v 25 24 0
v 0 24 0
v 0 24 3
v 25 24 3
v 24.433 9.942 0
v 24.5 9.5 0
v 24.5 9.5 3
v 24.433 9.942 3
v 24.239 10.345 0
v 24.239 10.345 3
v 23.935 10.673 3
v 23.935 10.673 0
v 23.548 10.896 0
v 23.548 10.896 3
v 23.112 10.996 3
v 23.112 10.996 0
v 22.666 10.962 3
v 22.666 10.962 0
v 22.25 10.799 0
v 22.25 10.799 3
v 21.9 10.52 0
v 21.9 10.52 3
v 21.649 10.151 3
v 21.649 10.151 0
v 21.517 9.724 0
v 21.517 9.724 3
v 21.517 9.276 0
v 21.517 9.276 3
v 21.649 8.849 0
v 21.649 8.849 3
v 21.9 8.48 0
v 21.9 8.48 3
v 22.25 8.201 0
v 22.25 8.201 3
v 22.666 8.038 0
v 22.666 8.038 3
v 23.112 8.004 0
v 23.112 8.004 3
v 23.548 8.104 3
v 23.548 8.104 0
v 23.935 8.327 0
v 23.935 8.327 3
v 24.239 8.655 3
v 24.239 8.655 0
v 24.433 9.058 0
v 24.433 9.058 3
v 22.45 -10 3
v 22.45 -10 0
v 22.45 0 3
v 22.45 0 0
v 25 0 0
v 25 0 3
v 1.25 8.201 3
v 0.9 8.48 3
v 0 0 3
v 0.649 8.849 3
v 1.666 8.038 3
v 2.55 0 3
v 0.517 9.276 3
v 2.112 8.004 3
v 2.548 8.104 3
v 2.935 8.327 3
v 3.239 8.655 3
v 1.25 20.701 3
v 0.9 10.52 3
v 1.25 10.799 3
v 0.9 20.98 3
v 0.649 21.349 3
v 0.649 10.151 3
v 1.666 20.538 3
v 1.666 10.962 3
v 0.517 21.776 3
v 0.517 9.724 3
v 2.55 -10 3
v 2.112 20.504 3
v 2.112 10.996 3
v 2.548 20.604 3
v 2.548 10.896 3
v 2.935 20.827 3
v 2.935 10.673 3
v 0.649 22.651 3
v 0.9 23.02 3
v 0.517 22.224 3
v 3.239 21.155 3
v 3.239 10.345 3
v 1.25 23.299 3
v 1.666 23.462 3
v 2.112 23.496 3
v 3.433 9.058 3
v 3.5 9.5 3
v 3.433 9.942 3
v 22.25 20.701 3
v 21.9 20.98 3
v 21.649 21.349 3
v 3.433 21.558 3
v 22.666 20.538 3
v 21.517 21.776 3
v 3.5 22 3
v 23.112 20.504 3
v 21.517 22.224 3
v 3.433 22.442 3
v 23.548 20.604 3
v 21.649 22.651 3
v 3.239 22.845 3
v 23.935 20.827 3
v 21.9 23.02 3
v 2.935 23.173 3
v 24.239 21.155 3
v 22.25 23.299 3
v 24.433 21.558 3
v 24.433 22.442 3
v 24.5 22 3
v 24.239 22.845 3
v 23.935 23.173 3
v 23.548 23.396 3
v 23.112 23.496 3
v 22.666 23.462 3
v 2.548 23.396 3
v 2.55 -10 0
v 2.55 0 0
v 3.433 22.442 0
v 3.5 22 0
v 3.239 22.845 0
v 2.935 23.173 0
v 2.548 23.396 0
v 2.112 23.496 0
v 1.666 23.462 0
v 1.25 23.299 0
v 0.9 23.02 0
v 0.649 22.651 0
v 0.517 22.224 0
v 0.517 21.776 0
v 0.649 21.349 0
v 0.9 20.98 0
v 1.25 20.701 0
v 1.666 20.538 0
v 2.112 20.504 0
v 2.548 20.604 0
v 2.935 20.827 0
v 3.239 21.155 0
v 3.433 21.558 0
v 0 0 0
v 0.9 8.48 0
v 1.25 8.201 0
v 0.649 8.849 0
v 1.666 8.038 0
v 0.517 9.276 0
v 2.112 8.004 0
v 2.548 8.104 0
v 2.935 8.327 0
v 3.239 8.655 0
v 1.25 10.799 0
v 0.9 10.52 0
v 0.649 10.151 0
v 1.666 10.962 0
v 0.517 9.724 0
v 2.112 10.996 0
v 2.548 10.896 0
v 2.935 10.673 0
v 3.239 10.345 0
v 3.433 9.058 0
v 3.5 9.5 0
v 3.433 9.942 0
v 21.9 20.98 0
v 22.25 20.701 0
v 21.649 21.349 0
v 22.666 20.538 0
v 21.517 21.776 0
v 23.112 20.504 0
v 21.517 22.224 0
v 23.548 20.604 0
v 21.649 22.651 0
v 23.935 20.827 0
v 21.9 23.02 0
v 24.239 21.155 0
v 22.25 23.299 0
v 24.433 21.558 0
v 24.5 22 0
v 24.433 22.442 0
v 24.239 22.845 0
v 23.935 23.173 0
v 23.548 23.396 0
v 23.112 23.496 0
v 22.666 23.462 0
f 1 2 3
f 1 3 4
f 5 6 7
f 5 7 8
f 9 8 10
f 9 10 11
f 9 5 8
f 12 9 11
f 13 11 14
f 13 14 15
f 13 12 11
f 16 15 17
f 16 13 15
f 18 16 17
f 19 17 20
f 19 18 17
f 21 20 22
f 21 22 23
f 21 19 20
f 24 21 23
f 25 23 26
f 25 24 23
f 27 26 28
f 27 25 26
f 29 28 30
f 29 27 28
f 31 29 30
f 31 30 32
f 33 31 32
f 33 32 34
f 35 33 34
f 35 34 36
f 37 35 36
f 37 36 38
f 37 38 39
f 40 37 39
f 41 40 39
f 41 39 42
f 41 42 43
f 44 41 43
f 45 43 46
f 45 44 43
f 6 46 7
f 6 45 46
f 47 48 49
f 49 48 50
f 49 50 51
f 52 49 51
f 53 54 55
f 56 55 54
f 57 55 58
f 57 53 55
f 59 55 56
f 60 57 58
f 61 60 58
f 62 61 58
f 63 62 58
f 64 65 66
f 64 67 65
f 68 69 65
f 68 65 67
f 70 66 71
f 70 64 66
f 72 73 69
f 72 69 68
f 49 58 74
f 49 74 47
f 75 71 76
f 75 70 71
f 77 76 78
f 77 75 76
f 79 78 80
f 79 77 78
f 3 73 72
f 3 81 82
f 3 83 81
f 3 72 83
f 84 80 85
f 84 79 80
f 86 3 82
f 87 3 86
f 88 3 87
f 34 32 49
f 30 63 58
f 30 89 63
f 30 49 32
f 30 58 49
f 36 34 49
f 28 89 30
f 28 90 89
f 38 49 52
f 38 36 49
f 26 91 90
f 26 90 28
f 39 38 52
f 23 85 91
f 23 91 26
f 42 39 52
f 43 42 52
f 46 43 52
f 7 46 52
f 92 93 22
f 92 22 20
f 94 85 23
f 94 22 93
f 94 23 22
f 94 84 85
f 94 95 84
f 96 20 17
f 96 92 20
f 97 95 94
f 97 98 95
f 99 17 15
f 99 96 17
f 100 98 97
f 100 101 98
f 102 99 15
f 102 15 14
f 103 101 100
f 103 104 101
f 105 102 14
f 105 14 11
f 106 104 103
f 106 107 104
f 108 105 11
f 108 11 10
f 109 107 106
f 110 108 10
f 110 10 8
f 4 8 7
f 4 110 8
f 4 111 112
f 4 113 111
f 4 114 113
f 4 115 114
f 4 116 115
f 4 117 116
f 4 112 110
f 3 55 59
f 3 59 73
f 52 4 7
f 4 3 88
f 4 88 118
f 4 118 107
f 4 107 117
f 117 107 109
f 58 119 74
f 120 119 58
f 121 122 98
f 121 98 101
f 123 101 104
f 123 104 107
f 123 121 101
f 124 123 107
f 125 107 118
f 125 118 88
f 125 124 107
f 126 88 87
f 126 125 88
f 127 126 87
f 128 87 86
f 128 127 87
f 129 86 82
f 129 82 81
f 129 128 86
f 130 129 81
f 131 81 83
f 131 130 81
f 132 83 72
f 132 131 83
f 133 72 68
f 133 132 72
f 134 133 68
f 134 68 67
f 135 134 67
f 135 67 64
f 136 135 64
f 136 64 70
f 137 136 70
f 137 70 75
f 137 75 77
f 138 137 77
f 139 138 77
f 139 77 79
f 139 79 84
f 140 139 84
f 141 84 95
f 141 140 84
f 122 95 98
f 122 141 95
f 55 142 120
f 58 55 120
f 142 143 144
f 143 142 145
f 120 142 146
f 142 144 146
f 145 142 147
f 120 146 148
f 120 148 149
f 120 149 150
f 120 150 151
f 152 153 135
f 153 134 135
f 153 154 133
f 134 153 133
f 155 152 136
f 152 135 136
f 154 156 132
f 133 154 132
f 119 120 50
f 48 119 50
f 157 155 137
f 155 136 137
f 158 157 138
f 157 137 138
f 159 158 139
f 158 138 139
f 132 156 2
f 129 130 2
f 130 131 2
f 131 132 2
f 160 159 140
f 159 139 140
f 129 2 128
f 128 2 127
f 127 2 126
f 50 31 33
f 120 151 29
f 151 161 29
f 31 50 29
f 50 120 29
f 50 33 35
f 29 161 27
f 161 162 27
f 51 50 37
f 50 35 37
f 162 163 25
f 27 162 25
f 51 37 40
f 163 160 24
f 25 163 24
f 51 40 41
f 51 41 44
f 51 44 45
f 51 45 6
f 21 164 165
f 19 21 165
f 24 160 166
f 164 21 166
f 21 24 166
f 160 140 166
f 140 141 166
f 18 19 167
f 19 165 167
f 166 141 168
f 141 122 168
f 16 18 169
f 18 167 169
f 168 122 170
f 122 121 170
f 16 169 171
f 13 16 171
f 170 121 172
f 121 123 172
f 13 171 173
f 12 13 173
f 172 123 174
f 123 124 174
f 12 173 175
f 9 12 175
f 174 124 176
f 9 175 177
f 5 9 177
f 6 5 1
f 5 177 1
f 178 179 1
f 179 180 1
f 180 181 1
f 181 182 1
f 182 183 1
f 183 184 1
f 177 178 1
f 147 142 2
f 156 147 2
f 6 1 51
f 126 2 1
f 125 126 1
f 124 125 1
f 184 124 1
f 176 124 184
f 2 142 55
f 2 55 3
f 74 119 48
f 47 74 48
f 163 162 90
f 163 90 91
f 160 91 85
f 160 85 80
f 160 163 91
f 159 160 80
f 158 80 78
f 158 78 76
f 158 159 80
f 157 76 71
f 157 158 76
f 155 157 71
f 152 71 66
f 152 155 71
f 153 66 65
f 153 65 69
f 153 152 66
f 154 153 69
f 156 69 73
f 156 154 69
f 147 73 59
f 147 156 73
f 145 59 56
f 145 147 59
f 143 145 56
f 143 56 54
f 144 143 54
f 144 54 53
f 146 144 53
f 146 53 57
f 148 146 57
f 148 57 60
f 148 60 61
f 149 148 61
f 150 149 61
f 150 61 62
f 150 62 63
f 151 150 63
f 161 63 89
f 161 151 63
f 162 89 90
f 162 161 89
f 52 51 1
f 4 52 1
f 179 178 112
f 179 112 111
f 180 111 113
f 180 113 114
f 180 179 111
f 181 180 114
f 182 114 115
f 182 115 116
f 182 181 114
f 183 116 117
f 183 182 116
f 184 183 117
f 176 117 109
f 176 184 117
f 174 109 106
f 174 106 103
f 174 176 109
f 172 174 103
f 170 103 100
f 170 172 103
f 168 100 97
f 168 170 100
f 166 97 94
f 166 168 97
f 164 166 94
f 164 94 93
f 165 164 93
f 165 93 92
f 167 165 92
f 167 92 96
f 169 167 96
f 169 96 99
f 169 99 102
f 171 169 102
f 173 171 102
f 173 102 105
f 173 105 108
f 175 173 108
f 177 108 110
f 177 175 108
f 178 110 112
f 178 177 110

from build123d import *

# Parameters (mm, degrees)
SKETCH1_W           = 25
SKETCH1_H           = 24
SKETCH1_R           = 1.5
SKETCH1_W_2         = 19.9
SKETCH1_H_2         = 10
BOSS_EXTRUDE1_DEPTH = 3


with BuildPart() as part:
    # Sketch1 → Boss-Extrude1 (new body)
    # profile 1 of 2: a face of its own
    with BuildSketch(Plane.XY):
        with Locations((12.5, 12)):
            Rectangle(SKETCH1_W, SKETCH1_H)
        with Locations((23, 22)):
            Circle(SKETCH1_R, mode=Mode.SUBTRACT)
        with Locations((2, 22)):
            Circle(SKETCH1_R, mode=Mode.SUBTRACT)
        with Locations((23, 9.5)):
            Circle(SKETCH1_R, mode=Mode.SUBTRACT)
        with Locations((2, 9.5)):
            Circle(SKETCH1_R, mode=Mode.SUBTRACT)
    # profile 2 of 2: a face of its own
    with BuildSketch(Plane.XY):
        with Locations((12.5, -5)):
            Rectangle(SKETCH1_W_2, SKETCH1_H_2)
    extrude(amount=BOSS_EXTRUDE1_DEPTH)


solid = part.part
